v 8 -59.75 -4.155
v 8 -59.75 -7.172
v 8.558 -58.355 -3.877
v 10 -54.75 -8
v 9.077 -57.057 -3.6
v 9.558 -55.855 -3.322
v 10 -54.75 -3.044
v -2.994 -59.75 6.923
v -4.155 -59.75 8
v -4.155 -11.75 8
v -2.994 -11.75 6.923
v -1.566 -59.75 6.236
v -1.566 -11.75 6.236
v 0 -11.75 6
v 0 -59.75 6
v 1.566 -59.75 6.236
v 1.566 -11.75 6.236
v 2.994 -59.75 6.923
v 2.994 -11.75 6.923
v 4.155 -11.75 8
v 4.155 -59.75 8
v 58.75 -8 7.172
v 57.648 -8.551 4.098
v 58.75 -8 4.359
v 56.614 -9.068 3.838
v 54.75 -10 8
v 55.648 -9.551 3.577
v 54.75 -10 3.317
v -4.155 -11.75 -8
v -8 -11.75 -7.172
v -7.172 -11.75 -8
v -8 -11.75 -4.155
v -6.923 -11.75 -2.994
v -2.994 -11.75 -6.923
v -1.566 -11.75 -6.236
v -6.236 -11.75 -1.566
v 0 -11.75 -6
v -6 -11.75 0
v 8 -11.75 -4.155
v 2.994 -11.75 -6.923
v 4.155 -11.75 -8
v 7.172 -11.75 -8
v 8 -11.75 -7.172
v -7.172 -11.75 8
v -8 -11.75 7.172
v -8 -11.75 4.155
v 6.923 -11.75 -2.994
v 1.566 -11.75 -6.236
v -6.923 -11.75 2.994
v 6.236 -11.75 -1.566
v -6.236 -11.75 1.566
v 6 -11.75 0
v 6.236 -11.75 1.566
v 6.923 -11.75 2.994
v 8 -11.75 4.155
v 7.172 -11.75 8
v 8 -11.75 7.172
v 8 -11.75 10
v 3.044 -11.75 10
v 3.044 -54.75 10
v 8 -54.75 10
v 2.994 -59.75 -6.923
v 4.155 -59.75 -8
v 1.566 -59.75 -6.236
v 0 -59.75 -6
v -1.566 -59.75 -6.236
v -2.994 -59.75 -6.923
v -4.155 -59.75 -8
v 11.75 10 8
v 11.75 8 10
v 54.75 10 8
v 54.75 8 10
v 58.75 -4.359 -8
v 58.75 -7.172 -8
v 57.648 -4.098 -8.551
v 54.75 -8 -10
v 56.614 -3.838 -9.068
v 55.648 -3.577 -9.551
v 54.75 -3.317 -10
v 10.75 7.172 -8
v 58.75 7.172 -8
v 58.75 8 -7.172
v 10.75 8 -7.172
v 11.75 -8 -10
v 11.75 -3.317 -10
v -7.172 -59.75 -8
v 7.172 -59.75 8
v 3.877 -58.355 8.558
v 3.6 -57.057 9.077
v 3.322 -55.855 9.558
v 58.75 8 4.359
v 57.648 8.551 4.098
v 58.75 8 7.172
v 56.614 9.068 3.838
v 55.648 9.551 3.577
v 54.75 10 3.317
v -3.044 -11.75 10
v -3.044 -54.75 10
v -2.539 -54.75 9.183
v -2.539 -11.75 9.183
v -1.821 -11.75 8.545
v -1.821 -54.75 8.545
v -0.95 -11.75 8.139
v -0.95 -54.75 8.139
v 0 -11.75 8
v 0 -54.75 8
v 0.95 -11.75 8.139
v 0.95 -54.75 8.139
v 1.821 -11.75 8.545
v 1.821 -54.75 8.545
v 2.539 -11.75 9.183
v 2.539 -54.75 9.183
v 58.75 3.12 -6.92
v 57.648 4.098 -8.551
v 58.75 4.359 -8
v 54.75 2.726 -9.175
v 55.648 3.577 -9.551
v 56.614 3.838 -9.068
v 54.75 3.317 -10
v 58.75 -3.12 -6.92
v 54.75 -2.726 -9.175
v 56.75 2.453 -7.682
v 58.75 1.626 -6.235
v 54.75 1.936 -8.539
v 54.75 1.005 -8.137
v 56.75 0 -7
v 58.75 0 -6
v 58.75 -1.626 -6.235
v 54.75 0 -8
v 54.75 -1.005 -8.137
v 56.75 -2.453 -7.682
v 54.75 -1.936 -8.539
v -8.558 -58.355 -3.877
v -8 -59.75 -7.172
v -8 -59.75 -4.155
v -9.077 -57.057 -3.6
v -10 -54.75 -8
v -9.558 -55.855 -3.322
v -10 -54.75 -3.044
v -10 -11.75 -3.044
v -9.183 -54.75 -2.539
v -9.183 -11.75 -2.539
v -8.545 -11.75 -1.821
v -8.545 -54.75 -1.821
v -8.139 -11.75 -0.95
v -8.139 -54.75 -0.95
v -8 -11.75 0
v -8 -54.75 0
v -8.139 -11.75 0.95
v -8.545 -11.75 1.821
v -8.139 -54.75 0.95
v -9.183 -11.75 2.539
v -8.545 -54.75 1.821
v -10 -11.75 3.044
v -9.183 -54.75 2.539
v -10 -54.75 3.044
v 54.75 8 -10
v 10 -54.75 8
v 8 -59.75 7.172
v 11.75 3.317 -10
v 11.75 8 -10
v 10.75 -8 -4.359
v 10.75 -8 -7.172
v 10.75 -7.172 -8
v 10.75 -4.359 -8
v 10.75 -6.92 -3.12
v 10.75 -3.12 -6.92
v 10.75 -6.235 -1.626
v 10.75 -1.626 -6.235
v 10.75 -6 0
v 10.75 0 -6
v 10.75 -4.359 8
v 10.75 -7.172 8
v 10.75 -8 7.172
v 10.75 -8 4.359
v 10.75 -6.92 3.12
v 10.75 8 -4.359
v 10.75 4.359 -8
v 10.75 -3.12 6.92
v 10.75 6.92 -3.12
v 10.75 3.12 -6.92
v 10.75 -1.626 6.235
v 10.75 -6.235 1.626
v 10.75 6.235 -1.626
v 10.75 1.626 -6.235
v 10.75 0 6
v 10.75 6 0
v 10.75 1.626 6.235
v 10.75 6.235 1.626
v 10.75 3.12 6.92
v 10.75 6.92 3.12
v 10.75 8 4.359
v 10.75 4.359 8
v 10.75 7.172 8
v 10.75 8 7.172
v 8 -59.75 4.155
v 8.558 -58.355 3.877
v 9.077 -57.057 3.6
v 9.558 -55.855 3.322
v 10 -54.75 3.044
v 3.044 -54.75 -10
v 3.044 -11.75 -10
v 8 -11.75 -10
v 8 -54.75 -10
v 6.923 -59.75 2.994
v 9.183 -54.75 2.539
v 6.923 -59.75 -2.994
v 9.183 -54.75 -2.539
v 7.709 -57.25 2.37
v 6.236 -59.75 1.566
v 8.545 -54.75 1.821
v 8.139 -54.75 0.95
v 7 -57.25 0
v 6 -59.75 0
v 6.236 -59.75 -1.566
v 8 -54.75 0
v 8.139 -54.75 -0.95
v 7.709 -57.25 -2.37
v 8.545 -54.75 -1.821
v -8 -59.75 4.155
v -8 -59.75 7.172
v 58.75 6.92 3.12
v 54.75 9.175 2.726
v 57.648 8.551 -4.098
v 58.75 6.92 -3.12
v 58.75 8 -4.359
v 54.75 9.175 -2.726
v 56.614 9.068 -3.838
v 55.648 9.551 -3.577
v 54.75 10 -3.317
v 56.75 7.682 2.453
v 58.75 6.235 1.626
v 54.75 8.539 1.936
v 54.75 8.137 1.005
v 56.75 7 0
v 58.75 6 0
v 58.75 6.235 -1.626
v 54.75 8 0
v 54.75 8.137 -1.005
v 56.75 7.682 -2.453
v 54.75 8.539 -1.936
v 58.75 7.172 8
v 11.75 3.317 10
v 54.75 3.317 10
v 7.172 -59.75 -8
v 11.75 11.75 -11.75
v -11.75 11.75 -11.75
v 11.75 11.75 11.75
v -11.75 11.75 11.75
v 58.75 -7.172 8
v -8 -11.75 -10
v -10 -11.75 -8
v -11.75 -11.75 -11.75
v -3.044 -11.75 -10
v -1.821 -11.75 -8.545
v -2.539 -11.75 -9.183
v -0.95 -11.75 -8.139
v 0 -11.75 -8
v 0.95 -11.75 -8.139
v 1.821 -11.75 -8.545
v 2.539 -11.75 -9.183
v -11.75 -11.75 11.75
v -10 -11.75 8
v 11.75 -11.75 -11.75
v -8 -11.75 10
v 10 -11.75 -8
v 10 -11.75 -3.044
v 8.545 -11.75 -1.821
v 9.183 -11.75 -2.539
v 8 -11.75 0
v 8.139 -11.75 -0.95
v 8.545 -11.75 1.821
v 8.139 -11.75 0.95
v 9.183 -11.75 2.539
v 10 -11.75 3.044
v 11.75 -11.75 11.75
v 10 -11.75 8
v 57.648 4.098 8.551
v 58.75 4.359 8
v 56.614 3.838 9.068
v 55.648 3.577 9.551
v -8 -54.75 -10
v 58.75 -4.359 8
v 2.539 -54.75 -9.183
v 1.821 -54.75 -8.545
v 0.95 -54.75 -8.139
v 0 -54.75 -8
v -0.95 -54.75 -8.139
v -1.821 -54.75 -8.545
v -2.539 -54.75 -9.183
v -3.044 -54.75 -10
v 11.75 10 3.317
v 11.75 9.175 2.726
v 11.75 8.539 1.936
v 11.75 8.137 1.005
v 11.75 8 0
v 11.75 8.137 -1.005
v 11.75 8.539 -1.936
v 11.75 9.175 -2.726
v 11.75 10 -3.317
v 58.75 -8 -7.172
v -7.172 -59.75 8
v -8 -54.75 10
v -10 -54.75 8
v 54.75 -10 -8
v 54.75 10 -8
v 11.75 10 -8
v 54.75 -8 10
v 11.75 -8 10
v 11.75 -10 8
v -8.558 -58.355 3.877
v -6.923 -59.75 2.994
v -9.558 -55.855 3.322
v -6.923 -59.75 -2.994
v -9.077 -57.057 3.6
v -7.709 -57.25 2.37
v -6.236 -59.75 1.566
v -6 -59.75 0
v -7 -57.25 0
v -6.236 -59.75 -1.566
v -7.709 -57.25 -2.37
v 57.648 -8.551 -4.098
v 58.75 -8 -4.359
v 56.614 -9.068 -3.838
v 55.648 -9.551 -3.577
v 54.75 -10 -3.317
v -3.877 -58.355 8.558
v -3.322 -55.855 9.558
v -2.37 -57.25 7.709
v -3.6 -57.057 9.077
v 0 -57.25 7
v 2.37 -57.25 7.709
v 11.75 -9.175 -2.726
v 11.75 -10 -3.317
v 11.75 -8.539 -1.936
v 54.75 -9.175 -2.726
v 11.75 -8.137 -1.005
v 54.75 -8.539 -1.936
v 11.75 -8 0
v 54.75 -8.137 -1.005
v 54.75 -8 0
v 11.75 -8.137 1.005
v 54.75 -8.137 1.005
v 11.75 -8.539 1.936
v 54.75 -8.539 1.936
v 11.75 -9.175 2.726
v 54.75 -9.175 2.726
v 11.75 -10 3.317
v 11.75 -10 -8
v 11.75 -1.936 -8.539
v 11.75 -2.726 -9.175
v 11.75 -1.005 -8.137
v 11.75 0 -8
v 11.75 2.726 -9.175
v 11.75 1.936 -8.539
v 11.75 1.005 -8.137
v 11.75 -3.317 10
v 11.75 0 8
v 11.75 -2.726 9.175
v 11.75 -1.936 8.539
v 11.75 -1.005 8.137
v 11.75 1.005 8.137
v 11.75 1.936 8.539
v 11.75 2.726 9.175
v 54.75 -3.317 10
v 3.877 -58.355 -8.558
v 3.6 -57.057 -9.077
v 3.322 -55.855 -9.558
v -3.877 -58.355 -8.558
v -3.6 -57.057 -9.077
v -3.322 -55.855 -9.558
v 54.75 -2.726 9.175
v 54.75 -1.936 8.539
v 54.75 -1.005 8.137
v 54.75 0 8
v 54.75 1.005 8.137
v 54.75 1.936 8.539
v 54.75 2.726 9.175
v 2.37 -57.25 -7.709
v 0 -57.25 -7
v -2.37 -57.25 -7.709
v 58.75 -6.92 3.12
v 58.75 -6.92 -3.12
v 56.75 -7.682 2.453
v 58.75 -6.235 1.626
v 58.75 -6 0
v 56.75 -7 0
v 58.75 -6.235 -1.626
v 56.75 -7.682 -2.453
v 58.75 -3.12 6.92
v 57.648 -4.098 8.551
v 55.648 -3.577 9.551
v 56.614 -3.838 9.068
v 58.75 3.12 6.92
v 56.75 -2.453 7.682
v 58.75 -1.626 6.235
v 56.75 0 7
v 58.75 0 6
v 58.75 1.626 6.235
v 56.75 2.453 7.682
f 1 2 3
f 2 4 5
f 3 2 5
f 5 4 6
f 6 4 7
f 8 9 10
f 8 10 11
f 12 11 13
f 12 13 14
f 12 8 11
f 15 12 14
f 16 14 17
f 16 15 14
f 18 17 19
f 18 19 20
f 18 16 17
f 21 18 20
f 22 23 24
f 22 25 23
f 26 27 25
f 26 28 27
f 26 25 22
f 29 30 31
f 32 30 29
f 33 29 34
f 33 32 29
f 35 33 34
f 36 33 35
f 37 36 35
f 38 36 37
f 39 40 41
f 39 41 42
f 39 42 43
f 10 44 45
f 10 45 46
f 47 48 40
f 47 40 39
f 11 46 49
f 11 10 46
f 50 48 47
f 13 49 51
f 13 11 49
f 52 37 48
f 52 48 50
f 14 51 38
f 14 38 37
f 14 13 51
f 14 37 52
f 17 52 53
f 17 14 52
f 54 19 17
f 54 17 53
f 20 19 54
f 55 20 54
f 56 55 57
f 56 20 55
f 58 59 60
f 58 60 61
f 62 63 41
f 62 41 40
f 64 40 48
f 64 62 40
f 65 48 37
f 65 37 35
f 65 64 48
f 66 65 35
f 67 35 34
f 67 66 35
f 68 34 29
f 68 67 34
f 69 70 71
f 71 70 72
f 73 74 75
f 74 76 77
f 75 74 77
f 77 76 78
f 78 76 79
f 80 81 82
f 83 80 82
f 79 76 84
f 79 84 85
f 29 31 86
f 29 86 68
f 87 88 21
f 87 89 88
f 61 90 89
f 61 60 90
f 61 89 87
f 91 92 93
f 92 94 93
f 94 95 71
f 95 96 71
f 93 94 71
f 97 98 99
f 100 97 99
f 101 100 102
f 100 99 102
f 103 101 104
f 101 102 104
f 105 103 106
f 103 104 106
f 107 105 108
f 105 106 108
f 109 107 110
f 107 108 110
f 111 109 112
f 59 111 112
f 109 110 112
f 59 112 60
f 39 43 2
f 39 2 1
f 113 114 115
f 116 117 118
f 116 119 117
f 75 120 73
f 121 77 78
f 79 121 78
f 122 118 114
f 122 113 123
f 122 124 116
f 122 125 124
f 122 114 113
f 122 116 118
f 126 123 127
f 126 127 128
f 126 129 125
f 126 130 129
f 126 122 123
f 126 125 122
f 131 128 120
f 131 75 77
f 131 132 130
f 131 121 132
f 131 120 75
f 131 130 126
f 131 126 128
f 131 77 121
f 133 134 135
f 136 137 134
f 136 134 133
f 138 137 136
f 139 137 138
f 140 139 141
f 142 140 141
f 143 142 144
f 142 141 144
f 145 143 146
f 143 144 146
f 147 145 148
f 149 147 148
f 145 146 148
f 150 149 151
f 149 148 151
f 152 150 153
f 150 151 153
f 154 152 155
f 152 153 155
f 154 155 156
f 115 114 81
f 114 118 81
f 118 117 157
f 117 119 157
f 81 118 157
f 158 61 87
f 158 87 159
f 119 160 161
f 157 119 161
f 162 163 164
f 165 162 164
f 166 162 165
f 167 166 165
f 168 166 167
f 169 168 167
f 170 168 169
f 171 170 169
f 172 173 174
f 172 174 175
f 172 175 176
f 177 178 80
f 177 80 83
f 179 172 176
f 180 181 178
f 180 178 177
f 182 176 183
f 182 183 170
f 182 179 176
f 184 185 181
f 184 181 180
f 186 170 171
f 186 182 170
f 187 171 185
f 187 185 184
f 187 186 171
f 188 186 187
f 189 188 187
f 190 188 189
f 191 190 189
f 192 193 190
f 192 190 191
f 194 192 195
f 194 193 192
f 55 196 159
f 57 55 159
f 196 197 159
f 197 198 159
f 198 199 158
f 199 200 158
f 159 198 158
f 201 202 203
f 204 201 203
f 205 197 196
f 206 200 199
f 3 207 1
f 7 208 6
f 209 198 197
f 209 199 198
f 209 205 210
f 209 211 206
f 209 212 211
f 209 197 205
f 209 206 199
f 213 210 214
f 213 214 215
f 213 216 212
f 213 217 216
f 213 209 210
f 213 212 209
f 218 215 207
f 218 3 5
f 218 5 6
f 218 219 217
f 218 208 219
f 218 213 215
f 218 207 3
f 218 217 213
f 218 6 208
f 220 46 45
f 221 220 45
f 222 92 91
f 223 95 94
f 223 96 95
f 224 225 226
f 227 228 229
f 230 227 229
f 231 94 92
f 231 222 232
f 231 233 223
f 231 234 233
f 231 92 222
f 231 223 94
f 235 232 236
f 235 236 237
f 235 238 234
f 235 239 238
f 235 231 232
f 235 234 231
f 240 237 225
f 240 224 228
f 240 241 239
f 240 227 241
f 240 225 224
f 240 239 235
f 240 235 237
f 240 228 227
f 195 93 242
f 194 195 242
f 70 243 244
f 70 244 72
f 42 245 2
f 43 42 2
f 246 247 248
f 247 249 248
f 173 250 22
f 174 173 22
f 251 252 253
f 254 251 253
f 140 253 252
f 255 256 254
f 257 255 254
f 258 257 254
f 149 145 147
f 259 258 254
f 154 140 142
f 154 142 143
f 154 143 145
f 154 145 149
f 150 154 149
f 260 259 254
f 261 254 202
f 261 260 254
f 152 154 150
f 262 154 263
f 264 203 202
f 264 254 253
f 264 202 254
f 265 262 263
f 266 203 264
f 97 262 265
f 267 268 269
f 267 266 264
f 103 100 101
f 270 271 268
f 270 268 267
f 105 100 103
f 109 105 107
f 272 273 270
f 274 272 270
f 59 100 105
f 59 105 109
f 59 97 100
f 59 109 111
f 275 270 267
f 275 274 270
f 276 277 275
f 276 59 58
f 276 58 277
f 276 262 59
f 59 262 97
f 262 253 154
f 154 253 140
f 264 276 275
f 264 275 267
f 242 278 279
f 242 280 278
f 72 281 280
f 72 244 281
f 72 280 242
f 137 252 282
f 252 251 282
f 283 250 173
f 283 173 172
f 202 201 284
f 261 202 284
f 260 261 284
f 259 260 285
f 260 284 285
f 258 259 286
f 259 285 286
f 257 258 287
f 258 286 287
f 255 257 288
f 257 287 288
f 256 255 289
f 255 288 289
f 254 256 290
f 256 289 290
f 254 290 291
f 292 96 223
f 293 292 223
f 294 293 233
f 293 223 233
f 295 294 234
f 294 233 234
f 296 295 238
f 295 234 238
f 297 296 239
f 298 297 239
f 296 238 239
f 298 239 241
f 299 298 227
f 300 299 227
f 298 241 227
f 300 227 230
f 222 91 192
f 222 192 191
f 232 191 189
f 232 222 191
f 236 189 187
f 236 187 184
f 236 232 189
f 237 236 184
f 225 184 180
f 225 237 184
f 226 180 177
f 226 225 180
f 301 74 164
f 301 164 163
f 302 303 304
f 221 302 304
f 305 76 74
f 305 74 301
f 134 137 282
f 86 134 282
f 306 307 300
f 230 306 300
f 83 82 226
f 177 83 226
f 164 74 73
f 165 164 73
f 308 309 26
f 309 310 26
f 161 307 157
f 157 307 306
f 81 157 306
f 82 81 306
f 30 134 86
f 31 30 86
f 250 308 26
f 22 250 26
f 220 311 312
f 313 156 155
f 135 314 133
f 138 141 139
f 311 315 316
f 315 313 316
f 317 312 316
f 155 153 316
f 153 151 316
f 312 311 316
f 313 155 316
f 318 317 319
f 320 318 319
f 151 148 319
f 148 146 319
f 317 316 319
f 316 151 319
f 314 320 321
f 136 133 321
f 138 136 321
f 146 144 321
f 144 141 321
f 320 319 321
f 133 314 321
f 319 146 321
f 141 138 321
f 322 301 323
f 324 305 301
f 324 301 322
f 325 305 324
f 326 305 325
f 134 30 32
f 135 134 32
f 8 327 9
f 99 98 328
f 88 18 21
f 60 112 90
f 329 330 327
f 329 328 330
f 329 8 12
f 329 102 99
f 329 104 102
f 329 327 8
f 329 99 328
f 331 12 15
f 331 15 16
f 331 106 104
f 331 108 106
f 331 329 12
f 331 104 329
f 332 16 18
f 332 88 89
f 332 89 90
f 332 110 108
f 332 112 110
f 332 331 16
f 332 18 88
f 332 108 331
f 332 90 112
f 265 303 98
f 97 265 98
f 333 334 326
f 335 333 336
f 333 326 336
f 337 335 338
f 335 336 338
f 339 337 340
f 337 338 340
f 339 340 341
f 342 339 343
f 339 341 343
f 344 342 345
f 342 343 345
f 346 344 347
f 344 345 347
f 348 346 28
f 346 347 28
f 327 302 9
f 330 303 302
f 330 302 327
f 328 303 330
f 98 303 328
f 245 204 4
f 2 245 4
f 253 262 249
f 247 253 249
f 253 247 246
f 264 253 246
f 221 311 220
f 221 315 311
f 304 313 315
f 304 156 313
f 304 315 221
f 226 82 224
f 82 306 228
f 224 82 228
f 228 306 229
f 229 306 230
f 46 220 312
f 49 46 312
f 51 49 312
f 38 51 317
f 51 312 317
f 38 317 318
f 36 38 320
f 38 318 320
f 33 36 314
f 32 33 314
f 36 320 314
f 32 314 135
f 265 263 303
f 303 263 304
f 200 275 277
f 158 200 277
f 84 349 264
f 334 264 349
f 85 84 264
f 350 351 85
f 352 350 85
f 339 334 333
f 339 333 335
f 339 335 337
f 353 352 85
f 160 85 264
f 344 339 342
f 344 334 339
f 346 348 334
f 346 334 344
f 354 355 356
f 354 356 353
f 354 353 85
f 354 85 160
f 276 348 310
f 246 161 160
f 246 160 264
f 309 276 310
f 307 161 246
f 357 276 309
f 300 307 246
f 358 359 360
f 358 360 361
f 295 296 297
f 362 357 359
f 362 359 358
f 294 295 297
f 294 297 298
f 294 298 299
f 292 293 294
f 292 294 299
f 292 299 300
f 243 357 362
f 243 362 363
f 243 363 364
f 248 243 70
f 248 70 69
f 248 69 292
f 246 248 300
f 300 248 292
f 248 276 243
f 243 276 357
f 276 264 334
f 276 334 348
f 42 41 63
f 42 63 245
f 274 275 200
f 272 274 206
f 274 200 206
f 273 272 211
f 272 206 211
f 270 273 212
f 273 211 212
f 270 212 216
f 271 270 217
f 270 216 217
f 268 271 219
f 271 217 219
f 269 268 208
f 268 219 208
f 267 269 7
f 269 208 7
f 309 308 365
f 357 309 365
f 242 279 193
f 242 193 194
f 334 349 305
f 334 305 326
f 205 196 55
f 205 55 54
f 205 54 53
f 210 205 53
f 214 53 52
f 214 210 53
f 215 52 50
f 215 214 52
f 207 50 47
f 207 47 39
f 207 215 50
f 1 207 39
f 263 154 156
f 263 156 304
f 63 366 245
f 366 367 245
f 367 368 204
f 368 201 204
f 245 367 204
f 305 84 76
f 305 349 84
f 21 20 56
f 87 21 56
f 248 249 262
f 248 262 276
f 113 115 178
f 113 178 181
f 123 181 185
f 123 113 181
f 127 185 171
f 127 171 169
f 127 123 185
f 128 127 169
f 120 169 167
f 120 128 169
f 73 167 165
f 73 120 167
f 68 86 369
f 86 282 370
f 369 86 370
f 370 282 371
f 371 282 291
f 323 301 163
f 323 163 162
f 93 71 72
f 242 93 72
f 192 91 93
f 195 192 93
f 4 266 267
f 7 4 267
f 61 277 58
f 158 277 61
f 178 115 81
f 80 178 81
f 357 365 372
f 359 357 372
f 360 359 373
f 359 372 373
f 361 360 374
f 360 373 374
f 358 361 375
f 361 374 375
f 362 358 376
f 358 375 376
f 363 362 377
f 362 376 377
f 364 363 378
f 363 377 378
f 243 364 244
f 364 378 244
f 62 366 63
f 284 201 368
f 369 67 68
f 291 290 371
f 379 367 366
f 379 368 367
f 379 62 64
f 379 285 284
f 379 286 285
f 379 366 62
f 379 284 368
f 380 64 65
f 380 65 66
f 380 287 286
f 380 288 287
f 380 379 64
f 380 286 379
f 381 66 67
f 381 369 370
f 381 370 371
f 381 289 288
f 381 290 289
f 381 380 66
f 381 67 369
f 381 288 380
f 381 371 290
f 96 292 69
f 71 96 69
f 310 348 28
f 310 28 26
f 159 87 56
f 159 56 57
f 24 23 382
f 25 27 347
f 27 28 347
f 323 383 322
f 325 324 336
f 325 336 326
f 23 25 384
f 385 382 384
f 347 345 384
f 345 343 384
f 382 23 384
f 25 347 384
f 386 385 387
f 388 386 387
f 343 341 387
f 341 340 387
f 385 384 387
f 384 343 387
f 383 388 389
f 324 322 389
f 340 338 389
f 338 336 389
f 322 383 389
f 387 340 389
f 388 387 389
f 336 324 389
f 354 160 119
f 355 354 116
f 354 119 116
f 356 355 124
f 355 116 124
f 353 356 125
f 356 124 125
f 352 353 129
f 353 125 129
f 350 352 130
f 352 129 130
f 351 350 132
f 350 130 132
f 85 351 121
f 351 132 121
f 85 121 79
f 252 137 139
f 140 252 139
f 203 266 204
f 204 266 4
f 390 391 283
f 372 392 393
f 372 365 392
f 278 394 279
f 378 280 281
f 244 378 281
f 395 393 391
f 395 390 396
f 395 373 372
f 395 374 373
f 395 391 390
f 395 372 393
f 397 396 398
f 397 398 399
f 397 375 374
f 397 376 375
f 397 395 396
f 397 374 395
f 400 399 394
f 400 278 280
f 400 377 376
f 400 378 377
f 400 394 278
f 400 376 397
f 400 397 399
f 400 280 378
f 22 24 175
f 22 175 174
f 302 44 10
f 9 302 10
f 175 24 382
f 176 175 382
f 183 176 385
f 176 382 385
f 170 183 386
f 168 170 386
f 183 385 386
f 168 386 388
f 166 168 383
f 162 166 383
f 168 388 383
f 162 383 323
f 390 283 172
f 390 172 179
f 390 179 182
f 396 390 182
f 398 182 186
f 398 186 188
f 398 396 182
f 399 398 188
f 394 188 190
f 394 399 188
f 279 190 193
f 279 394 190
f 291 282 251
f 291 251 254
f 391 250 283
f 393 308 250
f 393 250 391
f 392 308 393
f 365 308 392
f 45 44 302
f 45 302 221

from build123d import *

# Parameters (mm, degrees)
F0_W      = 23.5
F0_H      = 23.5
F1_DEPTH  = 11.75
F2_W      = 20
F2_H      = 20
F3_DEPTH  = 47
F4_SIZE   = 2
F5_R      = 3.75
F6_DEPTH  = 47
F7_SIZE2  = 4
F7_SIZE   = 2
F8_W      = 20
F8_H      = 20
F9_DEPTH  = 48
F10_R     = 3.3166247904
F11_DEPTH = 48
F12_SIZE  = 2
F13_SIZE2 = 5
F13_SIZE  = 2
F14_DEPTH = 48
F15_DEPTH = 48


with BuildPart() as f1:
    # F0 (on Top) → F1 (new body, symmetric)
    with BuildSketch(Plane.XY):
        Rectangle(F0_W, F0_H)
    extrude(amount=F1_DEPTH, both=True)

    # F2 (on face) → F3 (join)
    with BuildSketch(Plane.YZ.offset(11.75)):
        Rectangle(F2_W, F2_H)
    extrude(amount=F3_DEPTH)

    # F4
    f4_edges = [f1.edges().sort_by_distance(p)[0] for p in [
        (35.25, -10, 10),
        (35.25, -10, -10),
        (35.25, 10, 10),
        (35.25, 10, -10),
    ]]
    chamfer(f4_edges, length=F4_SIZE)

    # F5 (on face) → F6 (cut, through all)
    with BuildSketch(Plane.YZ.offset(58.75)):
        with Locations((0, 11.75)):
            Circle(F5_R)
        with Locations((11.75, 0)):
            Circle(F5_R)
        with Locations((0, -11.75)):
            Circle(F5_R)
        with Locations((-11.75, 0)):
            Circle(F5_R)
    extrude(amount=-F6_DEPTH, mode=Mode.SUBTRACT)

    # F7
    f7_edges = [f1.edges().sort_by_distance(p)[0] for p in [
        (58.75, -9, -9),
        (58.75, -5.658312, -10),
        (58.75, 0, -8),
        (58.75, 5.658312, -10),
        (58.75, 9, -9),
        (58.75, 10, -5.658312),
        (58.75, 8, 0),
        (58.75, 10, 5.658312),
        (58.75, 9, 9),
        (58.75, 5.658312, 10),
        (58.75, 0, 8),
        (58.75, -5.658312, 10),
        (58.75, -9, 9),
        (58.75, -10, 5.658312),
        (58.75, -8, 0),
        (58.75, -10, -5.658312),
    ]]
    f7_side = f1.faces().sort_by_distance((58.75, 0, 0))[0]
    chamfer(f7_edges, length=F7_SIZE, length2=F7_SIZE2, reference=f7_side)

    # F8 (on face) → F9 (join)
    with BuildSketch(Plane.XZ.offset(11.75)):
        Rectangle(F8_W, F8_H)
    extrude(amount=F9_DEPTH)

    # F10 (on face) → F11 (cut)
    with BuildSketch(Plane.XZ.offset(59.75)):
        with Locations((11.3166247904, 0)):
            Circle(F10_R)
        with Locations((0, 11.3166247904)):
            Circle(F10_R)
        with Locations((-11.3166247904, 0)):
            Circle(F10_R)
        with Locations((0, -11.3166247904)):
            Circle(F10_R)
    extrude(amount=-F11_DEPTH, mode=Mode.SUBTRACT)

    # F12
    f12_edges = [f1.edges().sort_by_distance(p)[0] for p in [
        (10, -35.75, 10),
        (10, -35.75, -10),
        (-10, -35.75, 10),
        (-10, -35.75, -10),
    ]]
    chamfer(f12_edges, length=F12_SIZE)

    # F13
    f13_edges = [f1.edges().sort_by_distance(p)[0] for p in [
        (-10, -59.75, -5.522046),
        (-9, -59.75, -9),
        (-8, -59.75, 0),
        (-5.522046, -59.75, -10),
        (-10, -59.75, 5.522046),
        (0, -59.75, -8),
        (-9, -59.75, 9),
        (5.522046, -59.75, -10),
        (-5.522046, -59.75, 10),
        (9, -59.75, -9),
        (0, -59.75, 8),
        (10, -59.75, -5.522046),
        (5.522046, -59.75, 10),
        (8, -59.75, 0),
        (9, -59.75, 9),
        (10, -59.75, 5.522046),
    ]]
    f13_side = f1.faces().sort_by_distance((0, -59.75, 0))[0]
    chamfer(f13_edges, length=F13_SIZE, length2=F13_SIZE2, reference=f13_side)

    # F14 (cut): a face of the model
    f14_faces = [f1.faces().sort_by_distance(p)[0] for p in [
        (58.75, 0, 0),
    ]]
    extrude(f14_faces, amount=-F14_DEPTH, mode=Mode.SUBTRACT)

    # F15 (cut): a face of the model
    f15_faces = [f1.faces().sort_by_distance(p)[0] for p in [
        (0, -59.75, 0),
    ]]
    extrude(f15_faces, amount=-F15_DEPTH, mode=Mode.SUBTRACT)


solid = f1.part
